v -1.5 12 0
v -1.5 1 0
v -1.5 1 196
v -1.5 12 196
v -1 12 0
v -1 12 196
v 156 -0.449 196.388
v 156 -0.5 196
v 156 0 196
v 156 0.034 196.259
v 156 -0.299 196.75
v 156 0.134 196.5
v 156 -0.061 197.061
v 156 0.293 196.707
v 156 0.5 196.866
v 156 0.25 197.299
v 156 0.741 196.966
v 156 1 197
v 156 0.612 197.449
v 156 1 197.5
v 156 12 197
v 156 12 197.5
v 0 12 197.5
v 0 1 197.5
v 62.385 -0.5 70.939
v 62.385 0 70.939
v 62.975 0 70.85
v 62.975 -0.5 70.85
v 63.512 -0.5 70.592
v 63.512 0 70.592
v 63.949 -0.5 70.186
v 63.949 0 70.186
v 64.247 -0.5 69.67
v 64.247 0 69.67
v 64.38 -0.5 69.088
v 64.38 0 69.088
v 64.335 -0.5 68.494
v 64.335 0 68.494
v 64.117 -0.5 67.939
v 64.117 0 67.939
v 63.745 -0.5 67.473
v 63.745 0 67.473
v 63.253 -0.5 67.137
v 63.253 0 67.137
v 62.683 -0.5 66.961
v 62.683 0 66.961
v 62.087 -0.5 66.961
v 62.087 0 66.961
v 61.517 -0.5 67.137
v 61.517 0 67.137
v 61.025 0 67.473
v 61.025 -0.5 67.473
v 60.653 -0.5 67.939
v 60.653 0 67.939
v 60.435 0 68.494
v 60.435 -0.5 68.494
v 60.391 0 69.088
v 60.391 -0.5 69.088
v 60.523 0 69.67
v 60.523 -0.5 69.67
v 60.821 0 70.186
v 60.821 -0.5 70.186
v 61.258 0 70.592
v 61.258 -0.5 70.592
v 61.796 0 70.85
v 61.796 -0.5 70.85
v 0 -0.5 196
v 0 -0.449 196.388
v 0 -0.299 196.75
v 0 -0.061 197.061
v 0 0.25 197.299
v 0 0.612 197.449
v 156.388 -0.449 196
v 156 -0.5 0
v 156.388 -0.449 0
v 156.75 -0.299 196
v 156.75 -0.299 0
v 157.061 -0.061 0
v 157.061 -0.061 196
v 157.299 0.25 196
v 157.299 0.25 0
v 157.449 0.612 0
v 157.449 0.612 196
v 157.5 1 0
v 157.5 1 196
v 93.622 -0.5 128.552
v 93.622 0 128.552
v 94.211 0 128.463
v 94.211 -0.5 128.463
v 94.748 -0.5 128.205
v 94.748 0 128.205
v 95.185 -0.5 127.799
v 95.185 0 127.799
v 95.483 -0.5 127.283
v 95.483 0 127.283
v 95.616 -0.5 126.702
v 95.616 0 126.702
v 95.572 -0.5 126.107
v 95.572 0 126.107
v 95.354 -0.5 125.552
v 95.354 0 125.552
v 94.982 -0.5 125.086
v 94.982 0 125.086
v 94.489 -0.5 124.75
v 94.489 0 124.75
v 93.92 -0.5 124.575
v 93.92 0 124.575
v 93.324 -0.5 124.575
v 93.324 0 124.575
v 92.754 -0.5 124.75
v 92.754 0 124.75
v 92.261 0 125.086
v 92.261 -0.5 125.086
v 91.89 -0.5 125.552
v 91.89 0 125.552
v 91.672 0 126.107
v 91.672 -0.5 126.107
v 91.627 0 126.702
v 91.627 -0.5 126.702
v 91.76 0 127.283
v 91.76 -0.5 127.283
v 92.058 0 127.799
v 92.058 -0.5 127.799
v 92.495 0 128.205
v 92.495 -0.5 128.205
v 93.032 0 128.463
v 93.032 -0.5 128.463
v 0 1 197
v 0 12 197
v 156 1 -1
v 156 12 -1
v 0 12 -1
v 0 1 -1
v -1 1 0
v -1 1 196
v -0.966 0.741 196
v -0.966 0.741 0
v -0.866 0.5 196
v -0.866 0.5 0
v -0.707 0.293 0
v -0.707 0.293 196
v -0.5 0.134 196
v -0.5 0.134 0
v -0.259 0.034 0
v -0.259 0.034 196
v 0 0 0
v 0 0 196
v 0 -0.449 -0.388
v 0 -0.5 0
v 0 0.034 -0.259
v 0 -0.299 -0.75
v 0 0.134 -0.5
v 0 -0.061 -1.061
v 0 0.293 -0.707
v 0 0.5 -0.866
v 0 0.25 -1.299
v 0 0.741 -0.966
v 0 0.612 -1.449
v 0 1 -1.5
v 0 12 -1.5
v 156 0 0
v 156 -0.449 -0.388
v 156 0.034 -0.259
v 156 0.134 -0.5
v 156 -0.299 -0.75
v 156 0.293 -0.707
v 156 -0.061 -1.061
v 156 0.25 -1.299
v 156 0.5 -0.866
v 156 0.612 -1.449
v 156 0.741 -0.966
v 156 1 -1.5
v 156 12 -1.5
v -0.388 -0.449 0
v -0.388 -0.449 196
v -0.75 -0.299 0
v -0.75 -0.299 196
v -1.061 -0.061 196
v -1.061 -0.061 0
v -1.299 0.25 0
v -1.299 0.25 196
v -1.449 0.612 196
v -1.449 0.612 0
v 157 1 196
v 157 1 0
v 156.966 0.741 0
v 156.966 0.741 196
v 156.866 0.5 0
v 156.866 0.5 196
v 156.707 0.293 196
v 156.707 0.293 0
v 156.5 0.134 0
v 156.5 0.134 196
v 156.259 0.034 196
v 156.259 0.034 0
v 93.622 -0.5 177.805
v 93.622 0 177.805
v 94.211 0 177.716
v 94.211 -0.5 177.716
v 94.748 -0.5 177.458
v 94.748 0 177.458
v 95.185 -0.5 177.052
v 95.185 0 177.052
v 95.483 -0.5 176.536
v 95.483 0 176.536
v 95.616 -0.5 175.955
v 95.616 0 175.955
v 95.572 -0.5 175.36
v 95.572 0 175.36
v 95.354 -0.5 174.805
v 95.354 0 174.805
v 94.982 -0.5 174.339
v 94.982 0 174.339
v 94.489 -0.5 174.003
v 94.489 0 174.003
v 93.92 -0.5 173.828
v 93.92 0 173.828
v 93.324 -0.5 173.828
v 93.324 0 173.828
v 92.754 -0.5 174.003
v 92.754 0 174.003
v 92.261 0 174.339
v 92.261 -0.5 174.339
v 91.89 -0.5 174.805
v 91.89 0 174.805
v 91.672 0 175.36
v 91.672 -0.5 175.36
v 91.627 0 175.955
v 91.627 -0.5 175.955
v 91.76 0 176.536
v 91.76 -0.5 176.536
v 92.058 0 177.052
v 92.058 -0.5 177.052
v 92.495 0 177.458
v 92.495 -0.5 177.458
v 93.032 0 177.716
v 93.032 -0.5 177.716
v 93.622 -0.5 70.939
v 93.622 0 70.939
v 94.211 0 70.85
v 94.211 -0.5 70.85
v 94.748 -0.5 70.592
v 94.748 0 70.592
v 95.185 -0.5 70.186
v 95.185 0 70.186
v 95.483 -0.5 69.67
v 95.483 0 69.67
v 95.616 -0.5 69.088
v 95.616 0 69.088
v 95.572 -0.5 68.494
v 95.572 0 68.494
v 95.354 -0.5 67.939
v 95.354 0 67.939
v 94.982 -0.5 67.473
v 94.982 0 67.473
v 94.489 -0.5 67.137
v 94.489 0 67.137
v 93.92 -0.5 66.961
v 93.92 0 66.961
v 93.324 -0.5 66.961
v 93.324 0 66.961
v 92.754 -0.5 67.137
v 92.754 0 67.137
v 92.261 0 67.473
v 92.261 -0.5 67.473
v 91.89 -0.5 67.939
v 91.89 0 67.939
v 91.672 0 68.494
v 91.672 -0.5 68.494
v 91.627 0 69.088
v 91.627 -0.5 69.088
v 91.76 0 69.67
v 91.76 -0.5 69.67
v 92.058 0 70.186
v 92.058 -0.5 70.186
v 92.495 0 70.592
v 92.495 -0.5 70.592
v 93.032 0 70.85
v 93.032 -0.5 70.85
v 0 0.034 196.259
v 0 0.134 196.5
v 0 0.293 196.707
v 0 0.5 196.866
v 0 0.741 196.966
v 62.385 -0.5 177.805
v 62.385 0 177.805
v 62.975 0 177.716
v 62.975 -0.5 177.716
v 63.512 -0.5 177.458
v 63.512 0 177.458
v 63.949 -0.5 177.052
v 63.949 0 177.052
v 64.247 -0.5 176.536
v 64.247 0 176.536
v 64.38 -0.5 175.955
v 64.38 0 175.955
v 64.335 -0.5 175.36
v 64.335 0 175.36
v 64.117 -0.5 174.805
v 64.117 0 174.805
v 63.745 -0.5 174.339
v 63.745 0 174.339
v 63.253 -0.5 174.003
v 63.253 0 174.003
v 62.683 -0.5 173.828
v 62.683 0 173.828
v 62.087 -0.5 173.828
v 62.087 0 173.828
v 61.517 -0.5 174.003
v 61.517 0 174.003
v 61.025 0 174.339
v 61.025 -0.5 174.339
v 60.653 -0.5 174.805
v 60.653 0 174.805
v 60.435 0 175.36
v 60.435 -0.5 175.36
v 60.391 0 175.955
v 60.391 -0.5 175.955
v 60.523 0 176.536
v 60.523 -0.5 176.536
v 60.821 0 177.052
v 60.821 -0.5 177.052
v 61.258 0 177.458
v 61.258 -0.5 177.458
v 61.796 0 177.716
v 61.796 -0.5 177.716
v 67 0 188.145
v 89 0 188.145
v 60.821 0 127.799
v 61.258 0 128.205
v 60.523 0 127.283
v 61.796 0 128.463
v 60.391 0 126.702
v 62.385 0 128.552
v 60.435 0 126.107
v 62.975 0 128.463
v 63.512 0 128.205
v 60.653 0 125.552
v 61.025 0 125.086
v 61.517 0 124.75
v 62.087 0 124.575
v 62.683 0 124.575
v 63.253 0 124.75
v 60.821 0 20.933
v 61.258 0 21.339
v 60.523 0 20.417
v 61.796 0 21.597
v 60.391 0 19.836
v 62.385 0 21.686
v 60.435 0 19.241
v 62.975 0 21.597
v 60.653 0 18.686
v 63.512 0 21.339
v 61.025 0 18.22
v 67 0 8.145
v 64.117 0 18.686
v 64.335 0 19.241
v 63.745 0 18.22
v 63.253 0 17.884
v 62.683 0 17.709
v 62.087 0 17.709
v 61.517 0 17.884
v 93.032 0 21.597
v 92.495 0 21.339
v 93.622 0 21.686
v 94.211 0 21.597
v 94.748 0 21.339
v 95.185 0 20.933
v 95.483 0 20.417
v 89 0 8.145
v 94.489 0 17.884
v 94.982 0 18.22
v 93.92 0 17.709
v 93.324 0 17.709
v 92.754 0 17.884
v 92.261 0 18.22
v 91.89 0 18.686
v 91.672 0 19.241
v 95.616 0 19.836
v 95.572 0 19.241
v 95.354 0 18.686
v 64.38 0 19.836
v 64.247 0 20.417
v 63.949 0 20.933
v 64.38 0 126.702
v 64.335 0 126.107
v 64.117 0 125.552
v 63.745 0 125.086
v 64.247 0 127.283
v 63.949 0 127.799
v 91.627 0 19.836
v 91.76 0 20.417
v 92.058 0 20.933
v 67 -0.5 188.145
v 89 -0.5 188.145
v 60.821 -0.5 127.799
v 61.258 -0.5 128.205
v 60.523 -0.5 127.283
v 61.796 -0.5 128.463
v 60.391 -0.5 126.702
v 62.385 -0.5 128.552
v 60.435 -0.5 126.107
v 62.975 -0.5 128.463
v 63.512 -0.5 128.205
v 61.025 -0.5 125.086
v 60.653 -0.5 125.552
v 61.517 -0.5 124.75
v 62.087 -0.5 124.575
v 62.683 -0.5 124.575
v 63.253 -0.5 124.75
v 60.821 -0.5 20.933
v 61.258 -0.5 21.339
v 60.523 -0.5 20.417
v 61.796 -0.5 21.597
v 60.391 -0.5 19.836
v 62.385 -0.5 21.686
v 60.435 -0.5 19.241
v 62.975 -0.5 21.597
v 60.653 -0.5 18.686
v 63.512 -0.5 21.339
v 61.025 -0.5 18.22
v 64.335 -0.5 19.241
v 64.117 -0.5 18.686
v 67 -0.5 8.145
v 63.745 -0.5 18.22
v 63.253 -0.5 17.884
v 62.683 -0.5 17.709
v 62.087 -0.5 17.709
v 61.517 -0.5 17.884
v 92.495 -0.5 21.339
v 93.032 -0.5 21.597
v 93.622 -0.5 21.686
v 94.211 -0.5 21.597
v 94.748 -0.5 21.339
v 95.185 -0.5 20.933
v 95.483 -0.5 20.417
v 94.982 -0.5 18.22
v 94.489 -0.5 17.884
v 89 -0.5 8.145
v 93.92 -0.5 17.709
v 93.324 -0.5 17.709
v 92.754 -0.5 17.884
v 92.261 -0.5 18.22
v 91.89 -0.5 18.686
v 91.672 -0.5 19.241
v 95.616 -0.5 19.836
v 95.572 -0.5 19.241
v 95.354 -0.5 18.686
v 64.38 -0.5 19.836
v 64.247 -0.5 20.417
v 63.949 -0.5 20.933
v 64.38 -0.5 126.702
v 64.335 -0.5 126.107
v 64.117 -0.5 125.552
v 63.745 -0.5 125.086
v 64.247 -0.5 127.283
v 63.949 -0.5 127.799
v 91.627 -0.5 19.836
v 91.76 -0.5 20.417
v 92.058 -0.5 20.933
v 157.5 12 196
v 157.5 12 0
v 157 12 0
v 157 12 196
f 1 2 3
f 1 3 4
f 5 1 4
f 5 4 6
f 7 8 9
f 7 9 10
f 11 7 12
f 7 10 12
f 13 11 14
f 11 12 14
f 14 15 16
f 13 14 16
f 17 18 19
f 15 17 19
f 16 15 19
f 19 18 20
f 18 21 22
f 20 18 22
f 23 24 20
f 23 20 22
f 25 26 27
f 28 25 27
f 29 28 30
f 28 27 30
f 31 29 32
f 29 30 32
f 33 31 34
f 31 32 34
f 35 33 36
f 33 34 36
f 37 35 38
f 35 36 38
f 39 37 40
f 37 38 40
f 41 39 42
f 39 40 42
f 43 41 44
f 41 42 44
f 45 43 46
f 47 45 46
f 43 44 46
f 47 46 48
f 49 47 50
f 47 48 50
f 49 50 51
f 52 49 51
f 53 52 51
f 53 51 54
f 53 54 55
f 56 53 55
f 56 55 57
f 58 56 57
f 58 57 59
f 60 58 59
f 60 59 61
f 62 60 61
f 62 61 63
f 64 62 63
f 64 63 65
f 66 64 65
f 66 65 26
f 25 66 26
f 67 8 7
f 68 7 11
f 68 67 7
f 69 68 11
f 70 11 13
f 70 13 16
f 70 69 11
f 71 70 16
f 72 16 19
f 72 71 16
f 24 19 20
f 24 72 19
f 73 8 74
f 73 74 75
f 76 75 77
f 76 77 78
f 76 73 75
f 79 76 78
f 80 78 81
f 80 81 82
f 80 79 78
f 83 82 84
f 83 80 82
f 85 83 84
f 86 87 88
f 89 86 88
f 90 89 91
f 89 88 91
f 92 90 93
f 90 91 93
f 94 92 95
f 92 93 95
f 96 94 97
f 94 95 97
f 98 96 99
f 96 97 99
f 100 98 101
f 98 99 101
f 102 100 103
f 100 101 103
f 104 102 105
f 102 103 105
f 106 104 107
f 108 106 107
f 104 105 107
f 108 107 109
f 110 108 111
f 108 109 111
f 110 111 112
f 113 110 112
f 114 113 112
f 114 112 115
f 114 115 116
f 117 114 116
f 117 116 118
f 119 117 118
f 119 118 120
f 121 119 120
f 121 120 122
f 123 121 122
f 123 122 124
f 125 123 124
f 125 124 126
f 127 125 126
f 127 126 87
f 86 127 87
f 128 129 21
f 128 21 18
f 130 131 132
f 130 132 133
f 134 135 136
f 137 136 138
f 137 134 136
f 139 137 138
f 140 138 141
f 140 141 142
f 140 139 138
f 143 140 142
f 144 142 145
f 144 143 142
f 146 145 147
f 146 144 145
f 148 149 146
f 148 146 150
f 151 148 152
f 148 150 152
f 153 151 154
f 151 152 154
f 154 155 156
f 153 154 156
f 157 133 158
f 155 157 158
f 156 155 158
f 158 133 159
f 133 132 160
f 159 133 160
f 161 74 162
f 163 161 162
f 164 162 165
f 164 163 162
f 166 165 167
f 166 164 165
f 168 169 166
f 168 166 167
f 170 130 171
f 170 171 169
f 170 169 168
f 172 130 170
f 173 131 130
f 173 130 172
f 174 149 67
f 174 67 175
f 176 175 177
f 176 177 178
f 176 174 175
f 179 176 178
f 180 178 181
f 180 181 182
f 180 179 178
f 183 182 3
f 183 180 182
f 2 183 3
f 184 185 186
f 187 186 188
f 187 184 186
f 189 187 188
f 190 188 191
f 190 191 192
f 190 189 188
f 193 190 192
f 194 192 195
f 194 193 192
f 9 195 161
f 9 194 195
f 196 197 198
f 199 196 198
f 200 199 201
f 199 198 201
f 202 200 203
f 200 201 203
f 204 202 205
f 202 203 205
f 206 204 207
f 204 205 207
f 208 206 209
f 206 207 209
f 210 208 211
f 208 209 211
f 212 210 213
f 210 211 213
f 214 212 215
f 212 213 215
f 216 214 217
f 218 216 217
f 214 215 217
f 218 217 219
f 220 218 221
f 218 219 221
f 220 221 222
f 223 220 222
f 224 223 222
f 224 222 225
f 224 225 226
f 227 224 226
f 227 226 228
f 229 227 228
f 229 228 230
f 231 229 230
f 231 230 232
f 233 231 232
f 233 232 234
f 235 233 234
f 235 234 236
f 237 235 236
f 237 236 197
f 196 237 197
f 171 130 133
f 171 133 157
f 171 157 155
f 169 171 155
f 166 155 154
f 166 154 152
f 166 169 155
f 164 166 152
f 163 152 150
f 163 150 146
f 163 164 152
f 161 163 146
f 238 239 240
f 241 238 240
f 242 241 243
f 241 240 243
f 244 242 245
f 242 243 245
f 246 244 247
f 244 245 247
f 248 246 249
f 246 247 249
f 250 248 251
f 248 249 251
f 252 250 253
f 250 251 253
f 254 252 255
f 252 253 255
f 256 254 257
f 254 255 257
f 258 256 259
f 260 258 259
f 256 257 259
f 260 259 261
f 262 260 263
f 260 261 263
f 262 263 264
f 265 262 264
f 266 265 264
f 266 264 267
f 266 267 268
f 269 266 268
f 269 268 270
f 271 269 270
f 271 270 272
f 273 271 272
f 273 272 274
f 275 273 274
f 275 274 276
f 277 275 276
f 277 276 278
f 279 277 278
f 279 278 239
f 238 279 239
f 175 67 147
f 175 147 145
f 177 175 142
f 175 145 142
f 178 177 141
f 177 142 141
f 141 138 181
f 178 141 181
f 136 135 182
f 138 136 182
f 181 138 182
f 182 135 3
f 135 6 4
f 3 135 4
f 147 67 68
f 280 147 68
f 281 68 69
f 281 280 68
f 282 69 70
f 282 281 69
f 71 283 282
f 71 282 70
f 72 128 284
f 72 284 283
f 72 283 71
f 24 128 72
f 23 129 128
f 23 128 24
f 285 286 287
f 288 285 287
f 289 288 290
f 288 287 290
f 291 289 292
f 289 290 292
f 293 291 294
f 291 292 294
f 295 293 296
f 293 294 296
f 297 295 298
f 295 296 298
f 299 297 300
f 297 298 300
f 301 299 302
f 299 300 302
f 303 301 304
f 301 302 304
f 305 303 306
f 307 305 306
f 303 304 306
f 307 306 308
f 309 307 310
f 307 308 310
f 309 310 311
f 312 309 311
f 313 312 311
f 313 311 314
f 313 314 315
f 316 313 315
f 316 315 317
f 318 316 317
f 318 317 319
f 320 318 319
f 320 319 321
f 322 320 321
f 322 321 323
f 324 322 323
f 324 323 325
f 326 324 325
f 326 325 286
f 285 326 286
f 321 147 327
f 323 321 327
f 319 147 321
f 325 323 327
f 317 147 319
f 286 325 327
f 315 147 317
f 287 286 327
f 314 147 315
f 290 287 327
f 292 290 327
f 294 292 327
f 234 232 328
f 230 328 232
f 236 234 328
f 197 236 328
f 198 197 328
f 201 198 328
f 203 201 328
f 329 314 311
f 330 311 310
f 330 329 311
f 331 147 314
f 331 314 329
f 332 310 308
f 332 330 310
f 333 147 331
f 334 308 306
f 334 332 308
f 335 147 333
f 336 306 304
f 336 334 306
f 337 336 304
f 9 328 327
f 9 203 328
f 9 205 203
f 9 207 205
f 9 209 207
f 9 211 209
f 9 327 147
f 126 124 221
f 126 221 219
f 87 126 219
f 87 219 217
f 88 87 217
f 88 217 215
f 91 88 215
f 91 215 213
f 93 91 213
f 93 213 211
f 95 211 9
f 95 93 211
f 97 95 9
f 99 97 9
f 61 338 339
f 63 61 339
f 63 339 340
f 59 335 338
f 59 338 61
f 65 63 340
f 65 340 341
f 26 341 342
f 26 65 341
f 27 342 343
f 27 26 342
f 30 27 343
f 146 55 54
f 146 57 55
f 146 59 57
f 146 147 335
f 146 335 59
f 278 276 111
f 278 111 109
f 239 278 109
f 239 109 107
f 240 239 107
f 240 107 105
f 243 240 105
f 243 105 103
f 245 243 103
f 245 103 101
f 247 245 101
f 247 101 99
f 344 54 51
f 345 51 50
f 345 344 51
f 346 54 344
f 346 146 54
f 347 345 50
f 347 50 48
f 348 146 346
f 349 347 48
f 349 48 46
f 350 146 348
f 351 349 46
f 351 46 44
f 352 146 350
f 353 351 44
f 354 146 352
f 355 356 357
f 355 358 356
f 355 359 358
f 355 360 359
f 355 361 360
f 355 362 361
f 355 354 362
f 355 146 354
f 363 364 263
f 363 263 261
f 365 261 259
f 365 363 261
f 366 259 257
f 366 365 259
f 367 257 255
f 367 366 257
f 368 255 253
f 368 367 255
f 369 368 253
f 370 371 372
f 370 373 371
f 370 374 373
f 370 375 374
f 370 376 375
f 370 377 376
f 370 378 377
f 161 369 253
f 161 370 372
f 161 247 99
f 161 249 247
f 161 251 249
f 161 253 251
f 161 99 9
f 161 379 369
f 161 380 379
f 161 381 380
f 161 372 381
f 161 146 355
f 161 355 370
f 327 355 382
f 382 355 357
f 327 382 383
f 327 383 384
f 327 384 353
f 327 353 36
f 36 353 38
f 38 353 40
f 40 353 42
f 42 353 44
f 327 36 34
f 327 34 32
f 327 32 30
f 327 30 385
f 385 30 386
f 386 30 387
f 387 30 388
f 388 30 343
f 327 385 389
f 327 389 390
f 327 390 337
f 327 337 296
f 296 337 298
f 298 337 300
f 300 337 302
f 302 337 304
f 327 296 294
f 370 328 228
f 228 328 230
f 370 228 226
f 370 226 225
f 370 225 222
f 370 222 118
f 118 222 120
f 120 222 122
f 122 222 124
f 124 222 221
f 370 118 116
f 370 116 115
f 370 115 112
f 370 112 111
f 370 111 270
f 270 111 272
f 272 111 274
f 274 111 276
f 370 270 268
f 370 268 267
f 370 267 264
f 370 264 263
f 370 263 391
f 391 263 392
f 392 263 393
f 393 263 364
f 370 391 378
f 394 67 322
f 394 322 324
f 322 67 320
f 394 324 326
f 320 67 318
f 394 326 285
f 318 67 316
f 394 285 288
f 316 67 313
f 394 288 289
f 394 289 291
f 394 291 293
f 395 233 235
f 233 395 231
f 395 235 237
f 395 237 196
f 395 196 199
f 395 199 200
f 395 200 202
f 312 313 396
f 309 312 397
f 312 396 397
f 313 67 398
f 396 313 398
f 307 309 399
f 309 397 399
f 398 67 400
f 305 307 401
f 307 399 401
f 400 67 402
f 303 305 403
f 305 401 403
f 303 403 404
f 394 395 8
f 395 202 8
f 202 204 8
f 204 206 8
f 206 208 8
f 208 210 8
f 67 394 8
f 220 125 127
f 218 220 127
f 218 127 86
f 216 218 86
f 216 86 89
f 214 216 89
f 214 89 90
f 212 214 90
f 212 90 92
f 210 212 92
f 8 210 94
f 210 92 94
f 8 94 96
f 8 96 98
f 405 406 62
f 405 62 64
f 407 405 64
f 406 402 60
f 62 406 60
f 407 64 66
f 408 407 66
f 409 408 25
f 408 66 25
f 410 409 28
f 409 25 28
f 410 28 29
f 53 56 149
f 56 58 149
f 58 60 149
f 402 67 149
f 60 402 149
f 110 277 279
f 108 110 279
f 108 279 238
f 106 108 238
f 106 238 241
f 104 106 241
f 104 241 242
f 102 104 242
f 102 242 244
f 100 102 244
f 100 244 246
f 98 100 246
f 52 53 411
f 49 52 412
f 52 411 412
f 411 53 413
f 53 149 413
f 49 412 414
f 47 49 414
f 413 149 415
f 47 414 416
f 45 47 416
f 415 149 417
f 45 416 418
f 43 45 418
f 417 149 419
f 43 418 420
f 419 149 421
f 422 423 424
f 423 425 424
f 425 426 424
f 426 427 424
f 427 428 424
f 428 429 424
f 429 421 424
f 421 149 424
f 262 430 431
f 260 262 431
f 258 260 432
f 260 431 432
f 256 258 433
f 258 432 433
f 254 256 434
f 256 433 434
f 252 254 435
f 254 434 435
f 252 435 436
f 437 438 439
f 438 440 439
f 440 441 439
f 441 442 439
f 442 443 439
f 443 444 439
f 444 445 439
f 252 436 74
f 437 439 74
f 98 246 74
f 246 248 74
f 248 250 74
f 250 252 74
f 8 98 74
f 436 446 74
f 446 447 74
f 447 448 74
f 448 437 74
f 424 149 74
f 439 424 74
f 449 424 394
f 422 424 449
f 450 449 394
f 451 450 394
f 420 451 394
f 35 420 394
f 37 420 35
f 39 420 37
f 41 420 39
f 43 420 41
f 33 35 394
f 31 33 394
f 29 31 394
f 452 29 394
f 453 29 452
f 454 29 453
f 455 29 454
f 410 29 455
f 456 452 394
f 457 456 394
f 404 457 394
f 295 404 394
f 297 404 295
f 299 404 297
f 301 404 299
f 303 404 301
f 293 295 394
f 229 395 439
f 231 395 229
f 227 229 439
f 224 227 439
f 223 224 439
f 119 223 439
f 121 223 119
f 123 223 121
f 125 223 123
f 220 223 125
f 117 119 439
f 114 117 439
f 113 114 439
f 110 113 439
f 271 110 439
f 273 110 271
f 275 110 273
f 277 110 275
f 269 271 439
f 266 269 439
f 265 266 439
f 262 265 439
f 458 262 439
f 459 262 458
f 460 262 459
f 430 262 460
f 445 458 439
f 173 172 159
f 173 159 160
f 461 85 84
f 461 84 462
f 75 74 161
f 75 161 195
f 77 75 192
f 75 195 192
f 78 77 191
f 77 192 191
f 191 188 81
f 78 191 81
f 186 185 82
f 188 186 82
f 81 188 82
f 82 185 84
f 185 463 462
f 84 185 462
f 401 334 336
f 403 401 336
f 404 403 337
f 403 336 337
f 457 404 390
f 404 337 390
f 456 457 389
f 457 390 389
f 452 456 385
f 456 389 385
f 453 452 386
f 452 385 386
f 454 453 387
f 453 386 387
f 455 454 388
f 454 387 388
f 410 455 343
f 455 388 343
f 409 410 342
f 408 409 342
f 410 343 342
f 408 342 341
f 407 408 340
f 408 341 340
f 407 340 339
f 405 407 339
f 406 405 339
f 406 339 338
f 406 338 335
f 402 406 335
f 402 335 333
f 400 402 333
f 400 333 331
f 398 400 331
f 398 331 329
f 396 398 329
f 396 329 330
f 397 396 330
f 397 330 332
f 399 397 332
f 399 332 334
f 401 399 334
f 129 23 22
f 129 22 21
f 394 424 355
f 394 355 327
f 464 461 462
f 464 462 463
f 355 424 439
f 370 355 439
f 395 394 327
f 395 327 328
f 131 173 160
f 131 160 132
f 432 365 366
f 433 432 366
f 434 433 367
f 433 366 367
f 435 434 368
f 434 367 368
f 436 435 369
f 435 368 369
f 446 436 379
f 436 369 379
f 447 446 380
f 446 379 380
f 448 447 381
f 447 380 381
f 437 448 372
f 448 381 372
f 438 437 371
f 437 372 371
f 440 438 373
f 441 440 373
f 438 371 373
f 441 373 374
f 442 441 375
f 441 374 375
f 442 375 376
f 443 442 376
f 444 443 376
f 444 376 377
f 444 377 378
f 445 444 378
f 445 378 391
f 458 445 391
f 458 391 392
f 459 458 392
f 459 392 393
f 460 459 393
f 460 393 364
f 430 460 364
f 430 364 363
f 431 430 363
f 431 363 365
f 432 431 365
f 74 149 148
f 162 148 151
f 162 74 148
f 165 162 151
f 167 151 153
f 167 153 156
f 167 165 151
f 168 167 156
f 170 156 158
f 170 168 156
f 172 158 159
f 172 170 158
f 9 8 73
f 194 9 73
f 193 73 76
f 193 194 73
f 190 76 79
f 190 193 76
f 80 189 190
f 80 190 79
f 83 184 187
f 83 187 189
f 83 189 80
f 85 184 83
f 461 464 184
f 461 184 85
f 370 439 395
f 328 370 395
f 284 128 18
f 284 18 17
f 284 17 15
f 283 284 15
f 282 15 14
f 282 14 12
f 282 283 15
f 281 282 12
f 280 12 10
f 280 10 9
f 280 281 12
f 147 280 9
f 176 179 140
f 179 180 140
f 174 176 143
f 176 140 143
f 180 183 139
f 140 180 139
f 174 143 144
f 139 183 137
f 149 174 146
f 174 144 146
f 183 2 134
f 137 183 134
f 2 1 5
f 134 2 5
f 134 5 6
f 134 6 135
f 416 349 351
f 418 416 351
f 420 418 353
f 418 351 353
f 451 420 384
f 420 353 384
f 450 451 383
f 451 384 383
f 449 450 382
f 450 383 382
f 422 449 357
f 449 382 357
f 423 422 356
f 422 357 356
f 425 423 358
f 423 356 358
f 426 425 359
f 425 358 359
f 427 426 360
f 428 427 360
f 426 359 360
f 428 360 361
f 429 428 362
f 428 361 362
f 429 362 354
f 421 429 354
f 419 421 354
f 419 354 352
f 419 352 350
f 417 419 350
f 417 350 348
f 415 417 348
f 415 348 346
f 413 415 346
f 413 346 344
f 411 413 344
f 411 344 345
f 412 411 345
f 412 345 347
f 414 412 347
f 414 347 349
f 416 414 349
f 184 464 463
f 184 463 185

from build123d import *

# Parameters (mm, degrees)
SKETCH1_W          = 156
SKETCH1_H          = 196
BASE_FLANGE1_DEPTH = 0.5
EDGE_FLANGE1_DEPTH = 196
EDGE_FLANGE2_DEPTH = 156
EDGE_FLANGE3_DEPTH = 196
EDGE_FLANGE4_DEPTH = 156
SKETCH14_W         = 22
SKETCH14_H         = 180
CUT_EXTRUDE1_DEPTH = 2
SKETCH15_R         = 2
CUT_EXTRUDE2_DEPTH = 2


# Sheet-metal steps are written as plain solids
with BuildPart() as part:
    # Sketch1 → Base-Flange1 (new body)
    with BuildSketch(Plane(origin=(0, 0, 0), x_dir=(1, 0, 0), z_dir=(0, 1, 0))):
        with Locations((78, -98)):
            Rectangle(SKETCH1_W, SKETCH1_H)
    extrude(amount=-BASE_FLANGE1_DEPTH)

    # Edge-Flange1 section (across the edge) → Edge-Flange1 (add)
    with BuildSketch(Plane(origin=(-1, 0, 0), x_dir=(1, 0, 0), z_dir=(0, 0, 1))):
        with BuildLine():
            Line((-0.5, 1), (-0.5, 12))
            Line((-0.5, 12), (0, 12))
            Line((0, 12), (0, 1))
            ThreePointArc((0, 1), (0.292893219, 0.292893219), (1, 0))
            Line((1, 0), (1, -0.5))
            ThreePointArc((1, -0.5), (-0.060660172, -0.060660172), (-0.5, 1))
        make_face()
    extrude(amount=EDGE_FLANGE1_DEPTH)

    # Edge-Flange2 section (across the edge) → Edge-Flange2 (add)
    with BuildSketch(Plane(origin=(0, 0, 197), x_dir=(0, 0, -1), z_dir=(1, 0, 0))):
        with BuildLine():
            Line((-0.5, 1), (-0.5, 12))
            Line((-0.5, 12), (0, 12))
            Line((0, 12), (0, 1))
            ThreePointArc((0, 1), (0.292893219, 0.292893219), (1, 0))
            Line((1, 0), (1, -0.5))
            ThreePointArc((1, -0.5), (-0.060660172, -0.060660172), (-0.5, 1))
        make_face()
    extrude(amount=EDGE_FLANGE2_DEPTH)

    # Edge-Flange3 section (across the edge) → Edge-Flange3 (add)
    with BuildSketch(Plane(origin=(157, 0, 196), x_dir=(-1, 0, 0), z_dir=(0, 0, -1))):
        with BuildLine():
            Line((-0.5, 1), (-0.5, 12))
            Line((-0.5, 12), (0, 12))
            Line((0, 12), (0, 1))
            ThreePointArc((0, 1), (0.292893219, 0.292893219), (1, 0))
            Line((1, 0), (1, -0.5))
            ThreePointArc((1, -0.5), (-0.060660172, -0.060660172), (-0.5, 1))
        make_face()
    extrude(amount=EDGE_FLANGE3_DEPTH)

    # Edge-Flange4 section (across the edge) → Edge-Flange4 (add)
    with BuildSketch(Plane(origin=(156, 0, -1), x_dir=(0, 0, 1), z_dir=(-1, 0, 0))):
        with BuildLine():
            Line((-0.5, 1), (-0.5, 12))
            Line((-0.5, 12), (0, 12))
            Line((0, 12), (0, 1))
            ThreePointArc((0, 1), (0.292893219, 0.292893219), (1, 0))
            Line((1, 0), (1, -0.5))
            ThreePointArc((1, -0.5), (-0.060660172, -0.060660172), (-0.5, 1))
        make_face()
    extrude(amount=EDGE_FLANGE4_DEPTH)

    # Sketch14 → Cut-Extrude1 (cut)
    with BuildSketch(Plane.XZ.offset(0.5)):
        with Locations((78, 98.144635834)):
            Rectangle(SKETCH14_W, SKETCH14_H)
    extrude(amount=-CUT_EXTRUDE1_DEPTH, mode=Mode.SUBTRACT)

    # Sketch15 → Cut-Extrude2 (cut)
    with BuildSketch(Plane(origin=(0, 0, 0), x_dir=(1, 0, 0), z_dir=(0, 1, 0))):
        with Locations(Location((93.6217, -175.805181717, 0), (0, 0, 270))):
            Circle(SKETCH15_R)
        with Locations(Location((62.3851, -175.805181717, 0), (0, 0, 270))):
            Circle(SKETCH15_R)
        with Locations(Location((93.6217, -126.552336837, 0), (0, 0, 270))):
            Circle(SKETCH15_R)
        with Locations(Location((62.3851, -126.552336837, 0), (0, 0, 270))):
            Circle(SKETCH15_R)
        with Locations(Location((93.6217, -68.939033602, 0), (0, 0, 270))):
            Circle(SKETCH15_R)
        with Locations(Location((62.3851, -68.939033602, 0), (0, 0, 270))):
            Circle(SKETCH15_R)
        with Locations(Location((93.6217, -19.686188722, 0), (0, 0, 270))):
            Circle(SKETCH15_R)
        with Locations(Location((62.3851, -19.686188722, 0), (0, 0, 270))):
            Circle(SKETCH15_R)
    extrude(amount=-CUT_EXTRUDE2_DEPTH, mode=Mode.SUBTRACT)


solid = part.part
